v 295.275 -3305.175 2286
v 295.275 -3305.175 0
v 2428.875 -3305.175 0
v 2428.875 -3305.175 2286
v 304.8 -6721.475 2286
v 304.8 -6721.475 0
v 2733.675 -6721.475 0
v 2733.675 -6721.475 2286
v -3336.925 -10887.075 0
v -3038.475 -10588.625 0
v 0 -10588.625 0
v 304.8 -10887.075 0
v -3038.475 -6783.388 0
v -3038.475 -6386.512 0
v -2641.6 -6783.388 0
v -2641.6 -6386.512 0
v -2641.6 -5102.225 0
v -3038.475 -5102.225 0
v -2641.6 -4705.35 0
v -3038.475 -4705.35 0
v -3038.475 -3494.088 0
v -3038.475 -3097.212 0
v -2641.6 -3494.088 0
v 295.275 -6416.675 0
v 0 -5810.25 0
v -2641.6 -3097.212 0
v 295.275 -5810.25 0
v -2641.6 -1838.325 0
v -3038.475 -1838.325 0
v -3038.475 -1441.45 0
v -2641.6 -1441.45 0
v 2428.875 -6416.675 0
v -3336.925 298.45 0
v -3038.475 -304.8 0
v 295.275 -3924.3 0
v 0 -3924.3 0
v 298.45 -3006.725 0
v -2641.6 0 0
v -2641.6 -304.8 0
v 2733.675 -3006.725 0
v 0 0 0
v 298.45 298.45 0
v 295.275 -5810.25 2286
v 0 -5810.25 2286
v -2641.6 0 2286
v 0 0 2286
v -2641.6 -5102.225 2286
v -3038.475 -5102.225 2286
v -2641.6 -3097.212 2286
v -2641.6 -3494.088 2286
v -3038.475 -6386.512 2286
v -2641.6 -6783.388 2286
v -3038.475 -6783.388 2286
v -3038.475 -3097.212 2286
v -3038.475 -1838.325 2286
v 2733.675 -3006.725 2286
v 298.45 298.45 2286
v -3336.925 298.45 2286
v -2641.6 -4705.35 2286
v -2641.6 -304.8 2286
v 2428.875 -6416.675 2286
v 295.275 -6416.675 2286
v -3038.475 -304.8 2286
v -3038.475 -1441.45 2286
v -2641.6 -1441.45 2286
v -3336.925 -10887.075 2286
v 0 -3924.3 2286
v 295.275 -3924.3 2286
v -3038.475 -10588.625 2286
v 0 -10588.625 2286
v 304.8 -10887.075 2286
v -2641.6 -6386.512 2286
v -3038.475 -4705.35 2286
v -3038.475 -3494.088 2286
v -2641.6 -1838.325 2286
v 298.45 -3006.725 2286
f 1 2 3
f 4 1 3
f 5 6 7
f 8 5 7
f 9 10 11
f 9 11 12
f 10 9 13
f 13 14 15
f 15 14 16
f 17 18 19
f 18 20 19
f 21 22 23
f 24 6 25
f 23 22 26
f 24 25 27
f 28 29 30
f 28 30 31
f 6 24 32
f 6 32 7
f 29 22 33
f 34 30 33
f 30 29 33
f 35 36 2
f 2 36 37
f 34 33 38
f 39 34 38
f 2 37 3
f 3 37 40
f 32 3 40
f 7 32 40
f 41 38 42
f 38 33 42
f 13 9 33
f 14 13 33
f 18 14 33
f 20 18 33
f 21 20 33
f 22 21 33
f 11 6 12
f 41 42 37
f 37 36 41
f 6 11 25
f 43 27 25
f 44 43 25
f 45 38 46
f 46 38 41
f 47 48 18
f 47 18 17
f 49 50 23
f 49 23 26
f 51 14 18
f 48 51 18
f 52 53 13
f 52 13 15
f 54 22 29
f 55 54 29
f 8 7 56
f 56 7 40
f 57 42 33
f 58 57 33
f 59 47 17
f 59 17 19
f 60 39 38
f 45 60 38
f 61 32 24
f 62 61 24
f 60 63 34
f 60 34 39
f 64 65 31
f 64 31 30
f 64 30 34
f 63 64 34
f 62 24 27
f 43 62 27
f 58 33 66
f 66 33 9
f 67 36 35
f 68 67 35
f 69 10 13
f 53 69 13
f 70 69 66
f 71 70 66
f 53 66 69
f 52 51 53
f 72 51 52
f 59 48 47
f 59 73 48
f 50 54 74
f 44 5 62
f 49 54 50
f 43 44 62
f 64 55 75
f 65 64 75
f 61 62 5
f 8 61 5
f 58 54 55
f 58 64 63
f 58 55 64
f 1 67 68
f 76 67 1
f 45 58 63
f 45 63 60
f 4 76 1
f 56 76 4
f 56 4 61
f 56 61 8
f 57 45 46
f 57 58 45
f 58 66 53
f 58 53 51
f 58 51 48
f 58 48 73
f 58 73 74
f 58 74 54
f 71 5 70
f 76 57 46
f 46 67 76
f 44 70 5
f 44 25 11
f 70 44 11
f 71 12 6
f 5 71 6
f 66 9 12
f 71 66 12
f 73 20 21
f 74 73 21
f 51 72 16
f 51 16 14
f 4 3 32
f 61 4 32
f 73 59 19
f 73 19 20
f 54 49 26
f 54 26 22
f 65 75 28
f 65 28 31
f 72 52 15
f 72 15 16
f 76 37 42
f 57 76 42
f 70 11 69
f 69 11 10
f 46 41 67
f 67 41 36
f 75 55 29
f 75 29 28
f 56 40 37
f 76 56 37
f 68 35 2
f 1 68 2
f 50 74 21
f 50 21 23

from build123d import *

# Parameters (mm, degrees)
F1_DEPTH = 2286


with BuildPart() as f1:
    # F0 (on Top) → F1 (new body)
    with BuildSketch(Plane.XY):
        Polygon((298.45, 298.45), (-3336.925, 298.45), (-3336.925, -10887.075), (304.8, -10887.075), (304.8, -6721.475), (2733.675, -6721.475), (2733.675, -3006.725), (298.45, -3006.725), align=None)
        Polygon((-2641.6, 0), (0, 0), (0, -3924.3), (295.275, -3924.3), (295.275, -3305.175), (2428.875, -3305.175), (2428.875, -6416.675), (295.275, -6416.675), (295.275, -5810.25), (0, -5810.25), (0, -10588.625), (-3038.475, -10588.625), (-3038.475, -6783.3875), (-2641.6, -6783.3875), (-2641.6, -6386.5125), (-3038.475, -6386.5125), (-3038.475, -5102.225), (-2641.6, -5102.225), (-2641.6, -4705.35), (-3038.475, -4705.35), (-3038.475, -3494.0875), (-2641.6, -3494.0875), (-2641.6, -3097.2125), (-3038.475, -3097.2125), (-3038.475, -1838.325), (-2641.6, -1838.325), (-2641.6, -1441.45), (-3038.475, -1441.45), (-3038.475, -304.8), (-2641.6, -304.8), align=None, mode=Mode.SUBTRACT)
    extrude(amount=F1_DEPTH)


solid = f1.part
